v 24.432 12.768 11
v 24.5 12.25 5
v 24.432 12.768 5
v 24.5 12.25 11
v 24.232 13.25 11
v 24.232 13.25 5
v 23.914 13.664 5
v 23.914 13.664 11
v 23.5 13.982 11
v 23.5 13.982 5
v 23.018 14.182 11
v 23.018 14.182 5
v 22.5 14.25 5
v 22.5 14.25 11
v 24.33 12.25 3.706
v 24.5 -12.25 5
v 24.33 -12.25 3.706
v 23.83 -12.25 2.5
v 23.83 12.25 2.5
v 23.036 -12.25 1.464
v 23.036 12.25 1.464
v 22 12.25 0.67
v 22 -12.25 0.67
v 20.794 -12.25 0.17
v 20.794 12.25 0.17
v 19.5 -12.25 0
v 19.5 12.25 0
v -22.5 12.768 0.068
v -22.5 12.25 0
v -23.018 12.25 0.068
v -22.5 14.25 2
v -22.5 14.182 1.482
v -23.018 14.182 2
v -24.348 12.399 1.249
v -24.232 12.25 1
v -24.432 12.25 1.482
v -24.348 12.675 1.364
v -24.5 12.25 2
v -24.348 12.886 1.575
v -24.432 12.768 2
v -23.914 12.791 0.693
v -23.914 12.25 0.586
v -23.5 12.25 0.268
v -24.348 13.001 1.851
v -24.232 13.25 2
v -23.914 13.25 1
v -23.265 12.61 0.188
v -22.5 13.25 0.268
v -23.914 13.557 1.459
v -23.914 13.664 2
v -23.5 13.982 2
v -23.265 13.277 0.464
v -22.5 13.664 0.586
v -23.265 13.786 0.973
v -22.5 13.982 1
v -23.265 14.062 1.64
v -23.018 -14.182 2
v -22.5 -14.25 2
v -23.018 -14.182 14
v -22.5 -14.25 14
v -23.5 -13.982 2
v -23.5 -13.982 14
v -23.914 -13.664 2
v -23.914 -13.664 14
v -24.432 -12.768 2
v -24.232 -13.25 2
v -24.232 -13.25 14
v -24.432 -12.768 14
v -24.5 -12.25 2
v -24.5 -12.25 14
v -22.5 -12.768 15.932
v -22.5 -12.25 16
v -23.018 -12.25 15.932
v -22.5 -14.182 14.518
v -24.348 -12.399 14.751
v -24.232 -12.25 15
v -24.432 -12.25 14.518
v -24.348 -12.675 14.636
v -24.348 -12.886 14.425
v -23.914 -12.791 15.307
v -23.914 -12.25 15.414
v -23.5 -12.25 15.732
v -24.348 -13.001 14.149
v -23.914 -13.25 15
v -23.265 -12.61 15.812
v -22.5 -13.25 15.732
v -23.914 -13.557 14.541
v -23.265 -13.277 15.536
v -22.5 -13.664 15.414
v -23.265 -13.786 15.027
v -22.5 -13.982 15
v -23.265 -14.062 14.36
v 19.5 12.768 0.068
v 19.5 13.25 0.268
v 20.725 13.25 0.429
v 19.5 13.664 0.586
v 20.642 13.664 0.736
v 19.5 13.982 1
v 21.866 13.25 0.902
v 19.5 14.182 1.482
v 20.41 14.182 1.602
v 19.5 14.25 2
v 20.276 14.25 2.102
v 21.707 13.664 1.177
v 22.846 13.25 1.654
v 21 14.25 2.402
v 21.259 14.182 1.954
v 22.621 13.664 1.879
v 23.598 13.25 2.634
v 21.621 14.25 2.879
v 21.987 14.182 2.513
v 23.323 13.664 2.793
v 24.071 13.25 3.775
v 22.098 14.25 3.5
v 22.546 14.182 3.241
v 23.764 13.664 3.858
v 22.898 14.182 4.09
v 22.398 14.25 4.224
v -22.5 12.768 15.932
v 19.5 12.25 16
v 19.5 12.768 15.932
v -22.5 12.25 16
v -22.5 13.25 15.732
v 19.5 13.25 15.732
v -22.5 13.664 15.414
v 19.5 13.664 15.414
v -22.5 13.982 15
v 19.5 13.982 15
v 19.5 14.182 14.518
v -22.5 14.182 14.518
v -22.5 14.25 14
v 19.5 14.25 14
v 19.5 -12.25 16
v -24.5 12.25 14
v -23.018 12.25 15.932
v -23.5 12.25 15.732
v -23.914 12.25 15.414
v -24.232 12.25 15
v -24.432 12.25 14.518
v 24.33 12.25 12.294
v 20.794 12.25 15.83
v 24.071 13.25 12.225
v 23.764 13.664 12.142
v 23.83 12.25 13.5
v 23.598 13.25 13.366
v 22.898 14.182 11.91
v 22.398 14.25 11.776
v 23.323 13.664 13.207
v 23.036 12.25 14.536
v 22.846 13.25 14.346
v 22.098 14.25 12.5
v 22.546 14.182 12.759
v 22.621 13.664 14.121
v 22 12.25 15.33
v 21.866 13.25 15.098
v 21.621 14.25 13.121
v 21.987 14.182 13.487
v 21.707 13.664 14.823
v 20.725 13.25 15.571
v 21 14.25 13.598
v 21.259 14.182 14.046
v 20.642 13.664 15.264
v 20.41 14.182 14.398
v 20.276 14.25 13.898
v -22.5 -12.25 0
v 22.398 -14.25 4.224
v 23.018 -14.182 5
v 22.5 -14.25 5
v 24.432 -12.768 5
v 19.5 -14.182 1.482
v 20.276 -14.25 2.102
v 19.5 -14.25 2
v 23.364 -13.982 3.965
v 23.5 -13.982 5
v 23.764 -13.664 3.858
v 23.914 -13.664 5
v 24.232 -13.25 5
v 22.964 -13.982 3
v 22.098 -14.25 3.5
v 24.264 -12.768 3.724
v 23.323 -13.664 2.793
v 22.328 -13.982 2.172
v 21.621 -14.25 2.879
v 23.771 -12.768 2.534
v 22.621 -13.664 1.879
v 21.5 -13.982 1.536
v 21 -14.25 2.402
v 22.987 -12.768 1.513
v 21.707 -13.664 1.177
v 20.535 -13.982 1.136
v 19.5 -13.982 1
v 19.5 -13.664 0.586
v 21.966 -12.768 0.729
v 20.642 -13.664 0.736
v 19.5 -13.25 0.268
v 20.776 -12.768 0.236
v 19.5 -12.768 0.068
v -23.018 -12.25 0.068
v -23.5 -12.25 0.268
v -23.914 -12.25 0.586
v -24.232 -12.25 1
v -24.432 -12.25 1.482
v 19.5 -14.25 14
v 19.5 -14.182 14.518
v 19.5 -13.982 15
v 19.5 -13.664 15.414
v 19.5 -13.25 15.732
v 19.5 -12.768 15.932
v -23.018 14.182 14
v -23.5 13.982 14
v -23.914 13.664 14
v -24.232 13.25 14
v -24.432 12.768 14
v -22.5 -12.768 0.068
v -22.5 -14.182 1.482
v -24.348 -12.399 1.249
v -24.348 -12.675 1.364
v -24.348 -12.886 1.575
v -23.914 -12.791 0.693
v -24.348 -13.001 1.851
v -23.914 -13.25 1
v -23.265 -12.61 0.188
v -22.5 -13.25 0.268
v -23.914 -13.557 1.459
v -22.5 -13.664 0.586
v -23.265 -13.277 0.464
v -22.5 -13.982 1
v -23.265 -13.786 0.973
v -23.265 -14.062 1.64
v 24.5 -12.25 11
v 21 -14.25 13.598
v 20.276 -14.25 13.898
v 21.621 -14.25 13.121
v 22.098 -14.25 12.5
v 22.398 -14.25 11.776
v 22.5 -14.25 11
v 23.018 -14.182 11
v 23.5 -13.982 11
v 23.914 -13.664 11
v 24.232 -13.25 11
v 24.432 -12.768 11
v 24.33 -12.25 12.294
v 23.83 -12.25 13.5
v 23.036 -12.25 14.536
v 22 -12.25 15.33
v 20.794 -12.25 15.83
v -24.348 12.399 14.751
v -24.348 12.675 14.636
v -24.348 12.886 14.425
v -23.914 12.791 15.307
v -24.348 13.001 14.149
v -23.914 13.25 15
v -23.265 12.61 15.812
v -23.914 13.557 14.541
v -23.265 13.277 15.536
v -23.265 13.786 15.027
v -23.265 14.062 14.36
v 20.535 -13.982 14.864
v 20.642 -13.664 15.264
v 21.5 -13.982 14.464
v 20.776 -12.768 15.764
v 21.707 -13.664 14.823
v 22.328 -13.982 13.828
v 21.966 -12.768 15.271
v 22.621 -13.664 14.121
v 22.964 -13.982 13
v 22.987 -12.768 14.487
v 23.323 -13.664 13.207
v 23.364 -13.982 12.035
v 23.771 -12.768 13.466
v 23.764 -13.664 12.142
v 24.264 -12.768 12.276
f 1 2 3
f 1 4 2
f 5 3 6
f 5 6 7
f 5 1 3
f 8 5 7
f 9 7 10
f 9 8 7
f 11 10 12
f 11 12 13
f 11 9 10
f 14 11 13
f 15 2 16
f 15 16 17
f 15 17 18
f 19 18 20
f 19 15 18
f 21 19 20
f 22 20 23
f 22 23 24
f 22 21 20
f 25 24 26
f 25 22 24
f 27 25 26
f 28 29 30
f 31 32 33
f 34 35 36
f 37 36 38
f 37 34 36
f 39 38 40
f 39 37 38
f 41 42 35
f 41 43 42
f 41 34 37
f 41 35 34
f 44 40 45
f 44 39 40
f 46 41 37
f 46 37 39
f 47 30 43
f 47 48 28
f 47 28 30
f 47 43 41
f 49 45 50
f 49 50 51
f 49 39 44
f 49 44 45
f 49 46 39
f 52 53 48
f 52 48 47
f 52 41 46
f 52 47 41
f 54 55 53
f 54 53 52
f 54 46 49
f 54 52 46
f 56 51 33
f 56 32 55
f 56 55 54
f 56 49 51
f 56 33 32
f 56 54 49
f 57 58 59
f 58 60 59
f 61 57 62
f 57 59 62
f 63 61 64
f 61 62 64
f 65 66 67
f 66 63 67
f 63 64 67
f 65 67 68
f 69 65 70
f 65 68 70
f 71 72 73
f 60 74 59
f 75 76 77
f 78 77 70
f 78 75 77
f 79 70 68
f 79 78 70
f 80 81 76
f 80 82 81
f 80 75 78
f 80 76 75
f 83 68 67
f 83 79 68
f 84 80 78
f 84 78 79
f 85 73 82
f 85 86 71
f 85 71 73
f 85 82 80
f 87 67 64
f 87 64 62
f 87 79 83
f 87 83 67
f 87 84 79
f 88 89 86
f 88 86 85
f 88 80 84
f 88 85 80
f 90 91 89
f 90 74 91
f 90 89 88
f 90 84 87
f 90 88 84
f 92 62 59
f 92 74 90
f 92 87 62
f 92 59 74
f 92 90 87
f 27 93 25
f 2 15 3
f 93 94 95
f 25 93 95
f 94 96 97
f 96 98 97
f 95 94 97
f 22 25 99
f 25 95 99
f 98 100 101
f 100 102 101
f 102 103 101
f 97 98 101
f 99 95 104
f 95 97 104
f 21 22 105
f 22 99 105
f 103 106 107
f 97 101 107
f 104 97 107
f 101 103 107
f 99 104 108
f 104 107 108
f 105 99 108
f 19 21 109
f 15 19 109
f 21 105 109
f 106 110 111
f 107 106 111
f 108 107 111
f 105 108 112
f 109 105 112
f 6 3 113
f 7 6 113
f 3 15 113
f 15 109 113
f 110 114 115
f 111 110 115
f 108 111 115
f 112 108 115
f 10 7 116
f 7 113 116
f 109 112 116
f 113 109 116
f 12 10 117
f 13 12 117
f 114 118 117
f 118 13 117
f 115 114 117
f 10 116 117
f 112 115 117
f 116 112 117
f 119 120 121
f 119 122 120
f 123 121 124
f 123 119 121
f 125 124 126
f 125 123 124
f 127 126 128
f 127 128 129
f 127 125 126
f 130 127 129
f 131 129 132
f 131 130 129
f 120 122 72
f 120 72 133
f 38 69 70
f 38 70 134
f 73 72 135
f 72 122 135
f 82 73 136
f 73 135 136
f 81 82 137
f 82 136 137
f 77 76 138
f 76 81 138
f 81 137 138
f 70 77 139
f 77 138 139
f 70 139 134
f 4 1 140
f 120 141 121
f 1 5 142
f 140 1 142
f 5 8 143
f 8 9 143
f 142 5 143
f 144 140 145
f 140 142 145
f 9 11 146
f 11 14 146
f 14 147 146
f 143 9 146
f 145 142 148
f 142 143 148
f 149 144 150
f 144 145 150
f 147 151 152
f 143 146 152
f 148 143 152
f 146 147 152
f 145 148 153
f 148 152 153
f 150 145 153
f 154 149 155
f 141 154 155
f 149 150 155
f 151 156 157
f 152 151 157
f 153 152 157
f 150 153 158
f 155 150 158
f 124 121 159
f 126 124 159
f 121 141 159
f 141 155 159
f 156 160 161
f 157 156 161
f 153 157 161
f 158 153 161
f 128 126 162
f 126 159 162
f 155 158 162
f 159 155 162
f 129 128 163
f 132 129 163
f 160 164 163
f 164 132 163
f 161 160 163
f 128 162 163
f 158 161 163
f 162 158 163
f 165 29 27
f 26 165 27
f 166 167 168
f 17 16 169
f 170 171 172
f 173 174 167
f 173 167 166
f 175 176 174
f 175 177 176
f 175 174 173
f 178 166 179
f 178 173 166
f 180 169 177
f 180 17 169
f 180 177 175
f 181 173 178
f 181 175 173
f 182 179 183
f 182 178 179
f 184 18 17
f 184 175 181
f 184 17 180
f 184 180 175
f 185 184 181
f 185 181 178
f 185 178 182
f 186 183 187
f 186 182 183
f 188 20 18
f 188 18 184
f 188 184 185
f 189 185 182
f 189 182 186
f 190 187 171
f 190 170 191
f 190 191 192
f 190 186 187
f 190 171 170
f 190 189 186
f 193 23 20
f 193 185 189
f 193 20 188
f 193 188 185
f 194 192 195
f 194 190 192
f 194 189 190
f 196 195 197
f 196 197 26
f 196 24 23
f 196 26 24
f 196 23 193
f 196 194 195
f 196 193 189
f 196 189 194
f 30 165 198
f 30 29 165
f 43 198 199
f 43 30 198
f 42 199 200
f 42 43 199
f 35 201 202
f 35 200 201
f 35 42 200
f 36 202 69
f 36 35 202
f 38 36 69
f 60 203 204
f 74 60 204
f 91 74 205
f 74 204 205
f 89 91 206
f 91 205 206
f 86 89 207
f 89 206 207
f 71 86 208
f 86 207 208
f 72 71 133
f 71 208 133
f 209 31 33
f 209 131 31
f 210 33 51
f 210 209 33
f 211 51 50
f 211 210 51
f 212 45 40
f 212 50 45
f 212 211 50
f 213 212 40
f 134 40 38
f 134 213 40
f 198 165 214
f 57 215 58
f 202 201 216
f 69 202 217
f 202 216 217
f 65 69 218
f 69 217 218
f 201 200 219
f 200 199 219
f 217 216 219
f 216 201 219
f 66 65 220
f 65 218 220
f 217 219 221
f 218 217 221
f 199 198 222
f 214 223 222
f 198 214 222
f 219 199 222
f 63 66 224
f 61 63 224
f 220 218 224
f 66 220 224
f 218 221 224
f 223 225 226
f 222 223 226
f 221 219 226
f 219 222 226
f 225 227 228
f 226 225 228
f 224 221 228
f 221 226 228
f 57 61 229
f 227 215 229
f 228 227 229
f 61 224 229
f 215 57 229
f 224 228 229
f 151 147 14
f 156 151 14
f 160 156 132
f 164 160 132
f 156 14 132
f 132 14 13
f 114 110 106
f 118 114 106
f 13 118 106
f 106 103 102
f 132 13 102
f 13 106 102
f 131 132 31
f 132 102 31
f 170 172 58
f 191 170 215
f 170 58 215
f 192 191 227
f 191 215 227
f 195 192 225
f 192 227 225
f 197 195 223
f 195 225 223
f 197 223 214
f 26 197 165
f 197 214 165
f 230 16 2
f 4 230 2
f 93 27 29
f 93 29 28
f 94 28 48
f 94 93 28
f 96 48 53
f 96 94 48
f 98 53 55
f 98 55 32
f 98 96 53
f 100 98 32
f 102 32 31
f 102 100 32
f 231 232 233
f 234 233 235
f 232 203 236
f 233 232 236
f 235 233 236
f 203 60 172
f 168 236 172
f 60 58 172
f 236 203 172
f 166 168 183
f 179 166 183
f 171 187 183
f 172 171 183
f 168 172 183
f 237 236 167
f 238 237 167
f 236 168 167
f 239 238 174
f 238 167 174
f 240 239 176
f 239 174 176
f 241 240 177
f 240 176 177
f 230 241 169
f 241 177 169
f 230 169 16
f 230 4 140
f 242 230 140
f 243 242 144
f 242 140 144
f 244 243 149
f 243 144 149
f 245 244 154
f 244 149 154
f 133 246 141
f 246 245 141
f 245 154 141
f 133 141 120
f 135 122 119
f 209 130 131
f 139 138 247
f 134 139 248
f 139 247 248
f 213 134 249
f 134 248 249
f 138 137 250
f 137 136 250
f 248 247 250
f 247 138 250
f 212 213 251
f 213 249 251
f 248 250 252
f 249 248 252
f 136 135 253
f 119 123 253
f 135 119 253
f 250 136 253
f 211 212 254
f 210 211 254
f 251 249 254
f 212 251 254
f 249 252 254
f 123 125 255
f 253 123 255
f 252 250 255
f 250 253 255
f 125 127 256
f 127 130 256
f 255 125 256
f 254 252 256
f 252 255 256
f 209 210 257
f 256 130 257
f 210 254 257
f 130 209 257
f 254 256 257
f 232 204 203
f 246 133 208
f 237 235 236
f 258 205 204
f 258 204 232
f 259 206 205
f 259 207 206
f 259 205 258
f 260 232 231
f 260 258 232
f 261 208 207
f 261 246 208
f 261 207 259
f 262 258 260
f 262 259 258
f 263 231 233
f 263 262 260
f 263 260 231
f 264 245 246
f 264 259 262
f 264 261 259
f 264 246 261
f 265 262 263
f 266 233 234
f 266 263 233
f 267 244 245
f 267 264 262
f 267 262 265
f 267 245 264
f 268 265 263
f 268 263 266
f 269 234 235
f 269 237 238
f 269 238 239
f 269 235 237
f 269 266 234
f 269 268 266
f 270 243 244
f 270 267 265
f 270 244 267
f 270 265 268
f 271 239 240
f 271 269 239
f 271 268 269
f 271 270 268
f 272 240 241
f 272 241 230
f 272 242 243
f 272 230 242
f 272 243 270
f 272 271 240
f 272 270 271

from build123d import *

# Parameters (mm, degrees)
SKETCH1_W           = 41.5
SKETCH1_H           = 28.5
SKETCH1_W_2         = 7.5
BOSS_EXTRUDE1_DEPTH = 16
FILLET2_R           = 5
FILLET3_R           = 2


with BuildPart() as part:
    # Sketch1 → Boss-Extrude1 (new body)
    with BuildSketch(Plane.XY):
        with Locations((3.75, 0)):
            Rectangle(SKETCH1_W, SKETCH1_H)
        with Locations((-20.75, 0)):
            Rectangle(SKETCH1_W_2, SKETCH1_H)
    extrude(amount=BOSS_EXTRUDE1_DEPTH)

    # Fillet2
    fillet2_edges = [part.edges().sort_by_distance(p)[0] for p in [
        (24.5, 0, 16),
        (24.5, 0, 0),
    ]]
    fillet(fillet2_edges, radius=FILLET2_R)

    # Fillet3
    fillet3_edges = [part.edges().sort_by_distance(p)[0] for p in [
        (-2.5, -14.25, 16),
        (24.5, 14.25, 8),
        (24.5, -14.25, 8),
        (23.035533906, -14.25, 1.464466094),
        (23.035533906, -14.25, 14.535533906),
        (23.035533906, 14.25, 1.464466094),
        (23.035533906, 14.25, 14.535533906),
        (-2.5, 14.25, 16),
        (-2.5, -14.25, 0),
        (-24.5, 0, 0),
        (-2.5, 14.25, 0),
        (-24.5, 0, 16),
        (-24.5, -14.25, 8),
        (-24.5, 14.25, 8),
    ]]
    fillet(fillet3_edges, radius=FILLET3_R)


solid = part.part
